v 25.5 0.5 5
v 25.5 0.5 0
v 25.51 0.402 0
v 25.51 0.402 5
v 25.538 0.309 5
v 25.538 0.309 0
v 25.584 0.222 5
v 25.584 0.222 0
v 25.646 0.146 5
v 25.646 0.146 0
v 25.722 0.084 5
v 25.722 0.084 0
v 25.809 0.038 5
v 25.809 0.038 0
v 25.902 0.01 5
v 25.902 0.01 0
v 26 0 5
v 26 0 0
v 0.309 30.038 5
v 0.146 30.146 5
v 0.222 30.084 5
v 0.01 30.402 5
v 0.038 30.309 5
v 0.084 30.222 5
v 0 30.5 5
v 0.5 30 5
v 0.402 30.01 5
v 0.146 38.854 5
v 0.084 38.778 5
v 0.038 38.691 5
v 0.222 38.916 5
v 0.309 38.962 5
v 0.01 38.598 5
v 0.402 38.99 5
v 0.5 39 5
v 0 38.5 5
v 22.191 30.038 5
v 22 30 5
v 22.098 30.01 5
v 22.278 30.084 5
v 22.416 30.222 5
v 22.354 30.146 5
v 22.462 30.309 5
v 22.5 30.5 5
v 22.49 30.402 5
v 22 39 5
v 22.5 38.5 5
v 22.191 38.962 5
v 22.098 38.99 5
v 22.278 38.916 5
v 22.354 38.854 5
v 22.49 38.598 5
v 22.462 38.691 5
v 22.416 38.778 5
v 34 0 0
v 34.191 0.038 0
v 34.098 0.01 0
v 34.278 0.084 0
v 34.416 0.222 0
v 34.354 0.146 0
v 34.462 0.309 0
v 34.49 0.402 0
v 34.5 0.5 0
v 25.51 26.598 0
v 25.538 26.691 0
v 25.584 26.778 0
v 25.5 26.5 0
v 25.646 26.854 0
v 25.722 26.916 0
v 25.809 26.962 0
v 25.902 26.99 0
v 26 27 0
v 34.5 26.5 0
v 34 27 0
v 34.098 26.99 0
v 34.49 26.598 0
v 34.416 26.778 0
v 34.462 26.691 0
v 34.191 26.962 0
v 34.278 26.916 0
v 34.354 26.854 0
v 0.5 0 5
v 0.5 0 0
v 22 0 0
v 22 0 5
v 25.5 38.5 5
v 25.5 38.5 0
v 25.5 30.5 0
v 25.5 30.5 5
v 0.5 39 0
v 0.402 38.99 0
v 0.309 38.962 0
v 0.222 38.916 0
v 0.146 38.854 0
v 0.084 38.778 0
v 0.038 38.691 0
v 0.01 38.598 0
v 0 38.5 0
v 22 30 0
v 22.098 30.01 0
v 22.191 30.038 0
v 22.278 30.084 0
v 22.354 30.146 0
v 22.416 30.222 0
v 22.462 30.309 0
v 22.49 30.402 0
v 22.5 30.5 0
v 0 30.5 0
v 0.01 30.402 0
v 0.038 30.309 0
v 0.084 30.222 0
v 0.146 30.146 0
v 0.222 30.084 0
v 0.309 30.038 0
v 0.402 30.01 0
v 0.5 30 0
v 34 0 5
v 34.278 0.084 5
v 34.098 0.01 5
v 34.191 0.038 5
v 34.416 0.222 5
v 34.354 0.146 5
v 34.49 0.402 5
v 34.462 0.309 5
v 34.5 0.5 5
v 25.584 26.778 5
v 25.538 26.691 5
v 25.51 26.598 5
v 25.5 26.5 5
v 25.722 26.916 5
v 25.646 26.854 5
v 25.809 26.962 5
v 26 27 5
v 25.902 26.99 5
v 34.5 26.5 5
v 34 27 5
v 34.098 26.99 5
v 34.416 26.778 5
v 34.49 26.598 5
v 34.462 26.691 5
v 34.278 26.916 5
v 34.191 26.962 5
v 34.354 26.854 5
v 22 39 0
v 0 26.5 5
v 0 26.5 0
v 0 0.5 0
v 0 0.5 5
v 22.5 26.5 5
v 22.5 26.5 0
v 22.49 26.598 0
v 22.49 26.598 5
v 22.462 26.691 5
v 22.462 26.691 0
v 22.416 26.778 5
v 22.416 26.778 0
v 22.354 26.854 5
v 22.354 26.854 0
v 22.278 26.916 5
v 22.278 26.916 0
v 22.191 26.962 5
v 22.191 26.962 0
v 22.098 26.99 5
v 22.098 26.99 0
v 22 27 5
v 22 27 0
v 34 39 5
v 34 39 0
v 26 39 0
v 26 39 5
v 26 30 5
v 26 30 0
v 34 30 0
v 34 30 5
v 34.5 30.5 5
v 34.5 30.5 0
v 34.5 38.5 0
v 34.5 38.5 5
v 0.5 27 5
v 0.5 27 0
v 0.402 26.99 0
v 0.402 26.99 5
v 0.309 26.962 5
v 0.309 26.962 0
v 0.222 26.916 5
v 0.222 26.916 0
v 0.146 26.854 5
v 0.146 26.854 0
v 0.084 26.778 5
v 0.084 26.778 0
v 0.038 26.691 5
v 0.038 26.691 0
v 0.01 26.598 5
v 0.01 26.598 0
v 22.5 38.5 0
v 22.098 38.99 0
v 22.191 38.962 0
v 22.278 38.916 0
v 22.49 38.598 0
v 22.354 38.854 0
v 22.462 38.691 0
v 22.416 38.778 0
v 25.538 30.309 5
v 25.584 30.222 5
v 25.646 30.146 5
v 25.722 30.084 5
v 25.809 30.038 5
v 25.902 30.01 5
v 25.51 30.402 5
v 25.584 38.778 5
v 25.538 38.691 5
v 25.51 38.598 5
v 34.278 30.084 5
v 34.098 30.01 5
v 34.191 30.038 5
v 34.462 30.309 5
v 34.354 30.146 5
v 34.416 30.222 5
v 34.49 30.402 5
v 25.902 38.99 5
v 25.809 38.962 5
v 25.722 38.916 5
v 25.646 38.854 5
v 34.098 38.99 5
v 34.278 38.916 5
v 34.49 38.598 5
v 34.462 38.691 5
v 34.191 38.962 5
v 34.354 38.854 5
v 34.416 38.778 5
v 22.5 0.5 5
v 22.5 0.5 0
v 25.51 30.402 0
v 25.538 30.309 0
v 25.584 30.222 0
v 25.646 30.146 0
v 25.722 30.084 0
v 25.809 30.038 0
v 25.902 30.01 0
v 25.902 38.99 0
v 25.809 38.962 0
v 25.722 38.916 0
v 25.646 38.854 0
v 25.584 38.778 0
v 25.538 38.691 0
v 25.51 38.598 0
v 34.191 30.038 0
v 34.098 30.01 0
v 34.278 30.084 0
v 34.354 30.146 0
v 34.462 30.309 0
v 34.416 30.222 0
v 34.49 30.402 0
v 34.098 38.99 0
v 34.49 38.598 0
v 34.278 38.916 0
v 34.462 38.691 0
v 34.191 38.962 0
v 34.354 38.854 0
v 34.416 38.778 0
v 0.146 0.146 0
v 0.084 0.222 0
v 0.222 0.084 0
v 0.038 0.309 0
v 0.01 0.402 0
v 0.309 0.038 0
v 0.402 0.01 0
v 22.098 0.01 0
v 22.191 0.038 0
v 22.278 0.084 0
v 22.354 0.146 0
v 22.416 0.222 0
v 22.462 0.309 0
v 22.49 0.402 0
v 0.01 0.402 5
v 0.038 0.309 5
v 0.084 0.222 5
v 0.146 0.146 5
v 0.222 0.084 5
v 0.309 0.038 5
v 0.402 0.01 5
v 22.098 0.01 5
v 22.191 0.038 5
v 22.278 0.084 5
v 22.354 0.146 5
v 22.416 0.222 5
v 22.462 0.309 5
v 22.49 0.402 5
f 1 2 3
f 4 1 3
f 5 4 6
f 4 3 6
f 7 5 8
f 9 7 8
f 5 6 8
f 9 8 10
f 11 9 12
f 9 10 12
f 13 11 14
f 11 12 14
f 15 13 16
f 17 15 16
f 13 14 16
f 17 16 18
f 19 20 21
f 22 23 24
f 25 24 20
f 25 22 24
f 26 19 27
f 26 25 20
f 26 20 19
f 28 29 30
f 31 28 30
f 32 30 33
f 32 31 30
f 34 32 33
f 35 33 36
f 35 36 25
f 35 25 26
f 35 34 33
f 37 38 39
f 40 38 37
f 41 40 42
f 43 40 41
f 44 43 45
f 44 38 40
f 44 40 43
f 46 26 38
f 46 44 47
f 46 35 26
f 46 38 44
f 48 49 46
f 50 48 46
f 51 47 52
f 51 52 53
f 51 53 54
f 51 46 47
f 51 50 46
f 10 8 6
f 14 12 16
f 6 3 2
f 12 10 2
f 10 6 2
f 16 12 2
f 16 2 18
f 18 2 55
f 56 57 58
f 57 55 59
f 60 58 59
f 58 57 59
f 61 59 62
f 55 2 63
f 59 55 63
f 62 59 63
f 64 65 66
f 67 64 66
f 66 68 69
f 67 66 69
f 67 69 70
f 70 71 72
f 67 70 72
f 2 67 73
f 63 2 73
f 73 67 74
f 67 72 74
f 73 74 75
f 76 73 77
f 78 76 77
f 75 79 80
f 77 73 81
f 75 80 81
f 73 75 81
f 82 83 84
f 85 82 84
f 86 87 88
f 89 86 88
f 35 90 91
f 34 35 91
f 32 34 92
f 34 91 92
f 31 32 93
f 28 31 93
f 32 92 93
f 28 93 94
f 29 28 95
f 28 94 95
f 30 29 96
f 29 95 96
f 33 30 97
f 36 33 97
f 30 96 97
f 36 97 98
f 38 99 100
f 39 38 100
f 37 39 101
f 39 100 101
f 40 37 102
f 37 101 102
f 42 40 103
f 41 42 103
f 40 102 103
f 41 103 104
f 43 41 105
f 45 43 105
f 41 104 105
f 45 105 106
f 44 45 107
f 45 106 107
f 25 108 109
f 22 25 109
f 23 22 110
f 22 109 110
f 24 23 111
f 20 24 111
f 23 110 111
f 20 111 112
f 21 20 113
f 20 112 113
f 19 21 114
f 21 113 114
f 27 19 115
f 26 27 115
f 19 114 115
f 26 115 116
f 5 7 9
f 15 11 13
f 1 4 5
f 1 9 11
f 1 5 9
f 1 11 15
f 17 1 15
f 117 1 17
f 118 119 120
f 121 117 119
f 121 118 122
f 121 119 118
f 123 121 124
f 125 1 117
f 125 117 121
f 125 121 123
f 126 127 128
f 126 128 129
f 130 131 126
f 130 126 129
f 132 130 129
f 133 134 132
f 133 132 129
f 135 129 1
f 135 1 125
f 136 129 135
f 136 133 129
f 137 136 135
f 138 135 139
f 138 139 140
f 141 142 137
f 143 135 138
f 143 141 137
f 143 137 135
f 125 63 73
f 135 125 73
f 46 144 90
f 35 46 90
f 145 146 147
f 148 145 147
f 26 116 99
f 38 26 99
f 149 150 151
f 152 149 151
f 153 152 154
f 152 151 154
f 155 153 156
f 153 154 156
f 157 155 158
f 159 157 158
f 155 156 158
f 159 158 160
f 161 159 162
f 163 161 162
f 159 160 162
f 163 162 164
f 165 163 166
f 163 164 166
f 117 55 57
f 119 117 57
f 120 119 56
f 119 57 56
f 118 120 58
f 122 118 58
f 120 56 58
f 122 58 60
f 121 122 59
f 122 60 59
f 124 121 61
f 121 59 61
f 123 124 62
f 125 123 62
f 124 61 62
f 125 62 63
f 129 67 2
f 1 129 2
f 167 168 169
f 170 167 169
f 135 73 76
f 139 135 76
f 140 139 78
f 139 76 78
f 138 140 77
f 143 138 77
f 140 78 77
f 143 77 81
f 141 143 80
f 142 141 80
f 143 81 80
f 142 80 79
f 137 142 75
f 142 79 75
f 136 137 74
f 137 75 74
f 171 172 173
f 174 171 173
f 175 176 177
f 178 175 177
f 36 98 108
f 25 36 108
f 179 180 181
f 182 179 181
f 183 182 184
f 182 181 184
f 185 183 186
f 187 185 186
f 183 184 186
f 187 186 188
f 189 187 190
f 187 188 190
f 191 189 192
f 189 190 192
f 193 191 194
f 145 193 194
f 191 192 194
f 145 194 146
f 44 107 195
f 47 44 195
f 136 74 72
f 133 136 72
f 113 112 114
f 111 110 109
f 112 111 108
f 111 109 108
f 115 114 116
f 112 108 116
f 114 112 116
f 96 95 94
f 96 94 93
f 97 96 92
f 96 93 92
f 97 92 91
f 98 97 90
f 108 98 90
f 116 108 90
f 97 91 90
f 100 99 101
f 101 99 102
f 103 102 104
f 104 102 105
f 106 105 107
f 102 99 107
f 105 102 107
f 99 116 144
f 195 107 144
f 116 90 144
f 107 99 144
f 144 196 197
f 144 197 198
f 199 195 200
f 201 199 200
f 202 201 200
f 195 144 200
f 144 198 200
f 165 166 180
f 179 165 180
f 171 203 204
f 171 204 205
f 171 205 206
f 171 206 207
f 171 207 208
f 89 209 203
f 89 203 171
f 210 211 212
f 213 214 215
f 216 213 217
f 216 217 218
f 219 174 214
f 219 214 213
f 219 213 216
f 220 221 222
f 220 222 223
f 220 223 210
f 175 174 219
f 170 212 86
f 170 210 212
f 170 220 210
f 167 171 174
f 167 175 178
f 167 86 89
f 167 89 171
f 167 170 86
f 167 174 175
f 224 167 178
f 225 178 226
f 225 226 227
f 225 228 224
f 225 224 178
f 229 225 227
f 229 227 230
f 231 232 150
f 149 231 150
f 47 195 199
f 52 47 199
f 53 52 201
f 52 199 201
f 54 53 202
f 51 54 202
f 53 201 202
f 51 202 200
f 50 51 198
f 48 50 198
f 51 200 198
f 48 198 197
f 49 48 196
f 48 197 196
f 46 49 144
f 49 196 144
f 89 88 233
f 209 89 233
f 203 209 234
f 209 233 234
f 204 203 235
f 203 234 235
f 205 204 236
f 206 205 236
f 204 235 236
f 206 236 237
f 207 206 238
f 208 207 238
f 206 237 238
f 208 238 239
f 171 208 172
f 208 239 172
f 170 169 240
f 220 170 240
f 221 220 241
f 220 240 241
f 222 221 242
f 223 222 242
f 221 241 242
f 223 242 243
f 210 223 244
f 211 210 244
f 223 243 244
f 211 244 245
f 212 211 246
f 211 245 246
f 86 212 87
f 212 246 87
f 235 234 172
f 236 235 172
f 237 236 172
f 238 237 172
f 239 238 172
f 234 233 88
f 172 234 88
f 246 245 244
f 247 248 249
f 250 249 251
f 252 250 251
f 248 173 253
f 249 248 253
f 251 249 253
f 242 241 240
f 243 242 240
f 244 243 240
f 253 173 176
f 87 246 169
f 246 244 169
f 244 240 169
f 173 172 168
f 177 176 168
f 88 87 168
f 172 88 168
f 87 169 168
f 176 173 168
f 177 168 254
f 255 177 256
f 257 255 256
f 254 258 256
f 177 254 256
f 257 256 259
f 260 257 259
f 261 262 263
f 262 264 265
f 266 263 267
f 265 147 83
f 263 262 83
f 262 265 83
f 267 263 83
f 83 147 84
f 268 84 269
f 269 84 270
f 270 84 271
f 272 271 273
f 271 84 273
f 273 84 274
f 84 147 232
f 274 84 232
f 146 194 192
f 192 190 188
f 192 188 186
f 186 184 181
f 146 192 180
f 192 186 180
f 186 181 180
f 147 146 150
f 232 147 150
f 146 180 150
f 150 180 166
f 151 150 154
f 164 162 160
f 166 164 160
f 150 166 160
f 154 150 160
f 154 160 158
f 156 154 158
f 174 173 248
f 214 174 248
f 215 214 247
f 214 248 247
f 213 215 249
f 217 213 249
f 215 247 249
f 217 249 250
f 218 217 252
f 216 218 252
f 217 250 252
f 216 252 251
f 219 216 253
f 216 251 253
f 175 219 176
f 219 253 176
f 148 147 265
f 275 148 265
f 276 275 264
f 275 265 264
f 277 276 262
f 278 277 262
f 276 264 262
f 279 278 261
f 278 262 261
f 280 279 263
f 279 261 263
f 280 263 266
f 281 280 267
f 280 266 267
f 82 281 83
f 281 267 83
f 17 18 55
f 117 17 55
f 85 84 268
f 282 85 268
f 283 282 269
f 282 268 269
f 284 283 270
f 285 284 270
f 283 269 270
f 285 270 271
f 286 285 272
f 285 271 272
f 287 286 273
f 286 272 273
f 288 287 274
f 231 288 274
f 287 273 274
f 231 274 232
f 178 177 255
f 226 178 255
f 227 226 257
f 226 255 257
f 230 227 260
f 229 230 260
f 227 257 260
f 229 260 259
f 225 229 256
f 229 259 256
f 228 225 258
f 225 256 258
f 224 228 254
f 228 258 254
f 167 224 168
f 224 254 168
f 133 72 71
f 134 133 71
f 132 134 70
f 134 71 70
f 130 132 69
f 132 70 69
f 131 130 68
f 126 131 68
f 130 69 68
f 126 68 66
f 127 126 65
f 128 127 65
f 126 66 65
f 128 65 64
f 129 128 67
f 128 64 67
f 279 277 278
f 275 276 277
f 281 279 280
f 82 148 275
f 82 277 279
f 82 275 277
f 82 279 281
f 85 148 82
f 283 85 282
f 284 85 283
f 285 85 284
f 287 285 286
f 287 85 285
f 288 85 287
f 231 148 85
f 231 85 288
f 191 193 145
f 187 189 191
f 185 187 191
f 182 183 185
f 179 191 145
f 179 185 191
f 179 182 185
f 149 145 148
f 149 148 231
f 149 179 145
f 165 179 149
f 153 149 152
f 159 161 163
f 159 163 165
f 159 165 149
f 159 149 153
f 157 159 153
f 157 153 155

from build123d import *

# Parameters (mm, degrees)
F1_DEPTH = 5


with BuildPart() as f1:
    # F0 (on Top) → F1 (new body)
    with BuildSketch(Plane.XY):
        with BuildLine():
            ThreePointArc((0, 0.5), (0.146447, 0.146447), (0.5, 0))
            Line((0.5, 0), (22, 0))
            ThreePointArc((22, 0), (22.353553, 0.146447), (22.5, 0.5))
            Line((22.5, 0.5), (22.5, 26.5))
            ThreePointArc((22.5, 26.5), (22.353553, 26.853553), (22, 27))
            Line((22, 27), (0.5, 27))
            ThreePointArc((0.5, 27), (0.146447, 26.853553), (0, 26.5))
            Line((0, 26.5), (0, 0.5))
        make_face()
        with BuildLine():
            ThreePointArc((25.5, 0.5), (25.646447, 0.146447), (26, 0))
            Line((26, 0), (34, 0))
            ThreePointArc((34, 0), (34.353553, 0.146447), (34.5, 0.5))
            Line((34.5, 0.5), (34.5, 26.5))
            ThreePointArc((34.5, 26.5), (34.353553, 26.853553), (34, 27))
            Line((34, 27), (26, 27))
            ThreePointArc((26, 27), (25.646447, 26.853553), (25.5, 26.5))
            Line((25.5, 26.5), (25.5, 0.5))
        make_face()
        with BuildLine():
            ThreePointArc((0, 30.5), (0.146447, 30.146447), (0.5, 30))
            Line((0.5, 30), (22, 30))
            ThreePointArc((22, 30), (22.353553, 30.146447), (22.5, 30.5))
            Line((22.5, 30.5), (22.5, 38.5))
            ThreePointArc((22.5, 38.5), (22.353553, 38.853553), (22, 39))
            Line((22, 39), (0.5, 39))
            ThreePointArc((0.5, 39), (0.146447, 38.853553), (0, 38.5))
            Line((0, 38.5), (0, 30.5))
        make_face()
        with BuildLine():
            ThreePointArc((25.5, 30.5), (25.646447, 30.146447), (26, 30))
            Line((26, 30), (34, 30))
            ThreePointArc((34, 30), (34.353553, 30.146447), (34.5, 30.5))
            Line((34.5, 30.5), (34.5, 38.5))
            ThreePointArc((34.5, 38.5), (34.353553, 38.853553), (34, 39))
            Line((34, 39), (26, 39))
            ThreePointArc((26, 39), (25.646447, 38.853553), (25.5, 38.5))
            Line((25.5, 38.5), (25.5, 30.5))
        make_face()
    extrude(amount=F1_DEPTH)


solid = f1.part
